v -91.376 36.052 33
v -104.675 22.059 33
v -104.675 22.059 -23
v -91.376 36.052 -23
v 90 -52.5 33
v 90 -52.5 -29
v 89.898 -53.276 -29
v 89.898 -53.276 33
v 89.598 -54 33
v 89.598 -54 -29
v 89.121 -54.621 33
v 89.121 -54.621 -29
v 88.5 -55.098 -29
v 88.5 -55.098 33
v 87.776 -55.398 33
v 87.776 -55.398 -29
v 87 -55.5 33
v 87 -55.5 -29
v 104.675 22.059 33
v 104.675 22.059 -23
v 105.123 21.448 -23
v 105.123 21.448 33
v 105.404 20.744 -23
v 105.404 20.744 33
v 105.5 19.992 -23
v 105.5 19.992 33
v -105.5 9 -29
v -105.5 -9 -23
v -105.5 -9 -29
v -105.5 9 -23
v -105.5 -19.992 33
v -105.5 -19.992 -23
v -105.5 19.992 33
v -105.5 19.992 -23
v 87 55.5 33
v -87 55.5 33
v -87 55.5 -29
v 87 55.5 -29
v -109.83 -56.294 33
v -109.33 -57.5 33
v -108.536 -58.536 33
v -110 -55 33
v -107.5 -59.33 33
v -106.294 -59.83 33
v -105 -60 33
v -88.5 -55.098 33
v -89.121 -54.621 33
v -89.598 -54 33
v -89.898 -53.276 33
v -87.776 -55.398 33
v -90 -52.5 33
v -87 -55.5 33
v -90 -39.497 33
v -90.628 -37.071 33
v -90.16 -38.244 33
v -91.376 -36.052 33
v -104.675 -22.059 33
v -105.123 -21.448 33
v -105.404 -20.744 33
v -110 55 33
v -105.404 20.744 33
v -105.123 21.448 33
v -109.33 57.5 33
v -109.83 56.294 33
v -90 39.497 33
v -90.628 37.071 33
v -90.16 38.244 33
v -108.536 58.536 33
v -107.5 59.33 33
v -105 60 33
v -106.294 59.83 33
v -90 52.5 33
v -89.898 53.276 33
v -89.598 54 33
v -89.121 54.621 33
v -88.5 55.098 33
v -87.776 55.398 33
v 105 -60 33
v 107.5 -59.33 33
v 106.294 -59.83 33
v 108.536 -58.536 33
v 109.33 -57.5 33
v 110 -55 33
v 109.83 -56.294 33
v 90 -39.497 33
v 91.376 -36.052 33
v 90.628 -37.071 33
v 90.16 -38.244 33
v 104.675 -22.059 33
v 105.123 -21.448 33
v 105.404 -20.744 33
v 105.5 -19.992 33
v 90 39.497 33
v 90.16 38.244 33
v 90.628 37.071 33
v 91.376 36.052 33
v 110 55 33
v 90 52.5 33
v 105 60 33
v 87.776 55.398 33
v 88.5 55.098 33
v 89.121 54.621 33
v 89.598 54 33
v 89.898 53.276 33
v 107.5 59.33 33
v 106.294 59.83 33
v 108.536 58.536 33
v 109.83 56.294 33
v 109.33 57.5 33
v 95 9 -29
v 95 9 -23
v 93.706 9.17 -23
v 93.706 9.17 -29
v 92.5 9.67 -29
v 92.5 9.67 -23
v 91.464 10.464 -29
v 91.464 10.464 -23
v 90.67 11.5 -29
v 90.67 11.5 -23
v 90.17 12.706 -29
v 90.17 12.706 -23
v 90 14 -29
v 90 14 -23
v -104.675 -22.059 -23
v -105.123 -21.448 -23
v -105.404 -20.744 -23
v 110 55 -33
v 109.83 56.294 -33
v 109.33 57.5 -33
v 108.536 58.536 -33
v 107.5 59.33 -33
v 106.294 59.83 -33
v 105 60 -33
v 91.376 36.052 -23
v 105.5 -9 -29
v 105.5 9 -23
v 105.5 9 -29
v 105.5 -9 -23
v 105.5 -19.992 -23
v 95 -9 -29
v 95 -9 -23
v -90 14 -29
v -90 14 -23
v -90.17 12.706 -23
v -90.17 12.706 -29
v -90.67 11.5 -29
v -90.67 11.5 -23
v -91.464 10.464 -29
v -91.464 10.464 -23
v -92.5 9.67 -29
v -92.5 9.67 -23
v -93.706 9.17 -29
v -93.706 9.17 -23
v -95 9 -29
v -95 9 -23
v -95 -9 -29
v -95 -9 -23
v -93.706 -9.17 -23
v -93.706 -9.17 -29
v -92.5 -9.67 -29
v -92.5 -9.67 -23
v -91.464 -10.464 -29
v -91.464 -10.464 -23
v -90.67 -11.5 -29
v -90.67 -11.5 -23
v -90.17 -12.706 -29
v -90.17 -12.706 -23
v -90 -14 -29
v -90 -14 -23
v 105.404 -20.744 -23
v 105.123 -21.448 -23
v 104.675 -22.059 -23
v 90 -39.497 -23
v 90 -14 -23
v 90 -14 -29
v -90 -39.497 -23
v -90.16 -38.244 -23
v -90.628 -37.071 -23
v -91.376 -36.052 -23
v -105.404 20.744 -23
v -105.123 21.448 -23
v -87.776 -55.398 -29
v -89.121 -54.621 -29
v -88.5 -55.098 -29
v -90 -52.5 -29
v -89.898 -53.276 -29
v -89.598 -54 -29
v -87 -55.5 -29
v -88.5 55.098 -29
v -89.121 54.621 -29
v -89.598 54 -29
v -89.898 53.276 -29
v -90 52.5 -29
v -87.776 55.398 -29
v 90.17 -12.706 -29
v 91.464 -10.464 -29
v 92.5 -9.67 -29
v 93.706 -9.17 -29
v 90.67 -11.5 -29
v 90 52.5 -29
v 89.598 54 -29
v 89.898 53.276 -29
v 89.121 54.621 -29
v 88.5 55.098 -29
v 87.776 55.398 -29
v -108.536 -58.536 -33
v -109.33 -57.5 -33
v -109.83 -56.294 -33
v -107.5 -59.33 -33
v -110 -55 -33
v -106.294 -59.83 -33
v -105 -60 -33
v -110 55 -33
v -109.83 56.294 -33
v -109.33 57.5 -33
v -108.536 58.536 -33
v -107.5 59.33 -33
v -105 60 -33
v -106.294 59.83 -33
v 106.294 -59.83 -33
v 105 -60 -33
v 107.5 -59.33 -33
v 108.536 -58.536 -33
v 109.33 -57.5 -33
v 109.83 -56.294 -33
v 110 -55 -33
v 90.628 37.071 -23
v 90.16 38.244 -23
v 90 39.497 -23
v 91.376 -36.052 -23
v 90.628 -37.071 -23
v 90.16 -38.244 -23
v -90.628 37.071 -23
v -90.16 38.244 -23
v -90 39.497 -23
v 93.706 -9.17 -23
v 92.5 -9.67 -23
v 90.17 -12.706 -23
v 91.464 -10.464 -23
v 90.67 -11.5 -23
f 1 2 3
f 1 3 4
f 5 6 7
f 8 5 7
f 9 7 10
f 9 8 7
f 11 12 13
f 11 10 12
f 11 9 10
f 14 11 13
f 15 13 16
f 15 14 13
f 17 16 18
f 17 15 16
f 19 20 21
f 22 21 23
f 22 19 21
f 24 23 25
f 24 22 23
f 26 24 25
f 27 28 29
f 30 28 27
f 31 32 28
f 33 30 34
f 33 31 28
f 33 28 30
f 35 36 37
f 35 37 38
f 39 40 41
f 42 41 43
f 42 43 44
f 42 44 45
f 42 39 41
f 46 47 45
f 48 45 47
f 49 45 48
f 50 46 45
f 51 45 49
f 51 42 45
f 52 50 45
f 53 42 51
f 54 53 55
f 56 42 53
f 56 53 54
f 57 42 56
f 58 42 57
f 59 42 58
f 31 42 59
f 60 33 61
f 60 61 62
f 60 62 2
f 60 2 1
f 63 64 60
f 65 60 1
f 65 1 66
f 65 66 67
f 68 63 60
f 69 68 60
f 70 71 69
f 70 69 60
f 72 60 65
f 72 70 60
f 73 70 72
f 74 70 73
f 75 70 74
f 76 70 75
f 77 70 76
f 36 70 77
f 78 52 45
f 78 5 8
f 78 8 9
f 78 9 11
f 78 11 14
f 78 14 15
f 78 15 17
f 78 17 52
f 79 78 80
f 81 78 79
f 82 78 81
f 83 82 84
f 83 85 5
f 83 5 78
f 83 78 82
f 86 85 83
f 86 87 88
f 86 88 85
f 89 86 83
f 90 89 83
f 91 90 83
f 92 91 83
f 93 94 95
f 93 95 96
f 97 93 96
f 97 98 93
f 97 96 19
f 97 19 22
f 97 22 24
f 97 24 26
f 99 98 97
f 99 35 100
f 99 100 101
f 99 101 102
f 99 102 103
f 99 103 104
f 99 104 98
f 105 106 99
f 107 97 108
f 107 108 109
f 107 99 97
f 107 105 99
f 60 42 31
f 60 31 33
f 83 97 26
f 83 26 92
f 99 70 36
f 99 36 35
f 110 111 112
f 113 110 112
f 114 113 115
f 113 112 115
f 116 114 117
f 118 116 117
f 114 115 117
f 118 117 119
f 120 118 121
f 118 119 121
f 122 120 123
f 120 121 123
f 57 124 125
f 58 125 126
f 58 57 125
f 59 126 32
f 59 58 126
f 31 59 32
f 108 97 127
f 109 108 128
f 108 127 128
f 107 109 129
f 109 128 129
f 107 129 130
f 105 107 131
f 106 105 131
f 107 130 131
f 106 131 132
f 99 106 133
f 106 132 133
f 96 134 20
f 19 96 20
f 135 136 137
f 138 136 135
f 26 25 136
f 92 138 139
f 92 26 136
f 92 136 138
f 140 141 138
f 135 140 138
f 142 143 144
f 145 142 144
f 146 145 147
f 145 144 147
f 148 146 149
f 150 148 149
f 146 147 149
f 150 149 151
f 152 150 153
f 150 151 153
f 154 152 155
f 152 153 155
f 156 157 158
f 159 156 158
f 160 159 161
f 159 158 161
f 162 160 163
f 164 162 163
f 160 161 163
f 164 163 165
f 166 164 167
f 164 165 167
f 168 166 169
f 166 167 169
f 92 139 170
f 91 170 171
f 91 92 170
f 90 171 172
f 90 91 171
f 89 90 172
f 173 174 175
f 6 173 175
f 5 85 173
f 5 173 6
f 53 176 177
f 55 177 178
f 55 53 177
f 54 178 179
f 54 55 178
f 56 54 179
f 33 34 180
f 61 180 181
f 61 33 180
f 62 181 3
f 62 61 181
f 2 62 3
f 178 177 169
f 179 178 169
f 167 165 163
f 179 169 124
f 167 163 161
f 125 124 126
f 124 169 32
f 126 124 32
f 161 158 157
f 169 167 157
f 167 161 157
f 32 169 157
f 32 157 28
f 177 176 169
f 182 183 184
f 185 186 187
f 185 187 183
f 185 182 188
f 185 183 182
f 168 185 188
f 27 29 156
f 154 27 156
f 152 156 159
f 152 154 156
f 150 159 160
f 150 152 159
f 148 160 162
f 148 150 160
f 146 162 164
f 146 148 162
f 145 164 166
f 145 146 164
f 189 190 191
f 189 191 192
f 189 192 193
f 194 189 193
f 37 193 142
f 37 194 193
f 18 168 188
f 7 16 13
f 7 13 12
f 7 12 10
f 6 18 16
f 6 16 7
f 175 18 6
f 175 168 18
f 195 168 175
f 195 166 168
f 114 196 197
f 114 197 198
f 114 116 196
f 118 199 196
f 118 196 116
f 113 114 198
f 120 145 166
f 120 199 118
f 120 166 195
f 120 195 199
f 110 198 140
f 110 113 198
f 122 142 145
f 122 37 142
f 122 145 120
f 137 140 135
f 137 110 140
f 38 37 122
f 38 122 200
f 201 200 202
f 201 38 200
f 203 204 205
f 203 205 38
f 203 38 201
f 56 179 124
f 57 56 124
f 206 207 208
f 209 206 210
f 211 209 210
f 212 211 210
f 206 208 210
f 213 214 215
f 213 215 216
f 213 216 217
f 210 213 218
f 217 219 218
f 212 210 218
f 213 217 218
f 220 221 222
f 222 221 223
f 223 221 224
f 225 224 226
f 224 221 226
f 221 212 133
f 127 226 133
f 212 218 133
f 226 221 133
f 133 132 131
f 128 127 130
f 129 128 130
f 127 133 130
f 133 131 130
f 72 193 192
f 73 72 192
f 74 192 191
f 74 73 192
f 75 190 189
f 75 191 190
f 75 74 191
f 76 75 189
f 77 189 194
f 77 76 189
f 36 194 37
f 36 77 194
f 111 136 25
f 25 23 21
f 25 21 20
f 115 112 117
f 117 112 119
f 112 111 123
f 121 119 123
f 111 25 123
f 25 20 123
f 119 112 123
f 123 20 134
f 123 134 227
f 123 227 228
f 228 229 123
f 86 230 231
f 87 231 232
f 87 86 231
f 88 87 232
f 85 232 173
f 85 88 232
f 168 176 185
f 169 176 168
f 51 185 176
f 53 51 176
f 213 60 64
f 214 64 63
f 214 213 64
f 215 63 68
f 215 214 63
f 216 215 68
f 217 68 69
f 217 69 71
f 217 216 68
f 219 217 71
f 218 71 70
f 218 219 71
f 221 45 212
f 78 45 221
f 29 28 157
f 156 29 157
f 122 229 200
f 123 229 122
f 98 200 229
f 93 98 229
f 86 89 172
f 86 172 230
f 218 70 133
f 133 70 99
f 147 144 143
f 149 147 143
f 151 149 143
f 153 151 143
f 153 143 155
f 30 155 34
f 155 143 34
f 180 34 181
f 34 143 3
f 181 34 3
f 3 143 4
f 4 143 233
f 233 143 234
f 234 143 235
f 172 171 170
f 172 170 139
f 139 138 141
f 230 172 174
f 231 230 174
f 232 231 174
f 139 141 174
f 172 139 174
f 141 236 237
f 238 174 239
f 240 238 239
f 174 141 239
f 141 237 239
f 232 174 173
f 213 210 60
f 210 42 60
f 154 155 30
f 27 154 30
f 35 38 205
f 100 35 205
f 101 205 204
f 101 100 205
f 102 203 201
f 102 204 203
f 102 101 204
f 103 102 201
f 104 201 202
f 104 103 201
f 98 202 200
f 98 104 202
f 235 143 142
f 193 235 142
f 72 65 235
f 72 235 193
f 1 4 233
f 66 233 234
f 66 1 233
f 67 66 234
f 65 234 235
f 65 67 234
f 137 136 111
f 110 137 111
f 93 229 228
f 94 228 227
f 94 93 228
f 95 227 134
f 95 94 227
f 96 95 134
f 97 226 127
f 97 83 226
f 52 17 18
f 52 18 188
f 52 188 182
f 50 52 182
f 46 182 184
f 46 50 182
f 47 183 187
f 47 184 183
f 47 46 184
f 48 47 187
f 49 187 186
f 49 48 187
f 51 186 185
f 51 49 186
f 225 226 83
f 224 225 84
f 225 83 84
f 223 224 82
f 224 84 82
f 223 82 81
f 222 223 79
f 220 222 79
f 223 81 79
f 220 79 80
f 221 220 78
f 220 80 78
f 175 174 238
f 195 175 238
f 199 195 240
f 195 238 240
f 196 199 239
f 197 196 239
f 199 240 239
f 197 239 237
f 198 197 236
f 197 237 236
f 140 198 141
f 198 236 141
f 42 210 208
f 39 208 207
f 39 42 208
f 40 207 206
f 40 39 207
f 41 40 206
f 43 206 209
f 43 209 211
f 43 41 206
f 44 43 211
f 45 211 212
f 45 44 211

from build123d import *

# Parameters (mm, degrees)
SKETCH1_W           = 220
SKETCH1_H           = 120
BOSS_EXTRUDE1_DEPTH = 33
CUT_EXTRUDE1_DEPTH  = 56
CUT_EXTRUDE2_DEPTH  = 6
FILLET1_R           = 5


with BuildPart() as part:
    # Sketch1 → Boss-Extrude1 (new, symmetric)
    with BuildSketch(Plane.XY):
        Rectangle(SKETCH1_W, SKETCH1_H)
    extrude(amount=BOSS_EXTRUDE1_DEPTH, both=True)

    # Sketch2 → Cut-Extrude1 (cut)
    with BuildSketch(Plane.XY.offset(33)):
        with BuildLine():
            Line((-87, 55.5), (87, 55.5))
            ThreePointArc((87, 55.5), (89.121320344, 54.621320344), (90, 52.5))
            Line((90, 52.5), (90, 39.49693341))
            ThreePointArc((90, 39.49693341), (90.356635174, 37.642435339), (91.375665238, 36.052488965))
            Line((91.375665238, 36.052488965), (104.674600857, 22.059000191))
            ThreePointArc((104.674600857, 22.059000191), (105.286018895, 21.105032366), (105.5, 19.992333524))
            Line((105.5, 19.992333524), (105.5, -19.992333524))
            ThreePointArc((105.5, -19.992333524), (105.286018895, -21.105032366), (104.674600857, -22.059000191))
            Line((104.674600857, -22.059000191), (91.375665238, -36.052488965))
            ThreePointArc((91.375665238, -36.052488965), (90.356635174, -37.642435339), (90, -39.49693341))
            Line((90, -39.49693341), (90, -52.5))
            ThreePointArc((90, -52.5), (89.121320344, -54.621320344), (87, -55.5))
            Line((87, -55.5), (-87, -55.5))
            ThreePointArc((-87, -55.5), (-89.121320344, -54.621320344), (-90, -52.5))
            Line((-90, -52.5), (-90, -39.49693341))
            ThreePointArc((-90, -39.49693341), (-90.356635174, -37.642435339), (-91.375665238, -36.052488965))
            Line((-91.375665238, -36.052488965), (-104.674600857, -22.059000191))
            ThreePointArc((-104.674600857, -22.059000191), (-105.286018895, -21.105032366), (-105.5, -19.992333524))
            Line((-105.5, -19.992333524), (-105.5, 19.992333524))
            ThreePointArc((-105.5, 19.992333524), (-105.286018895, 21.105032366), (-104.674600857, 22.059000191))
            Line((-104.674600857, 22.059000191), (-91.375665238, 36.052488965))
            ThreePointArc((-91.375665238, 36.052488965), (-90.356635174, 37.642435339), (-90, 39.49693341))
            Line((-90, 39.49693341), (-90, 52.5))
            ThreePointArc((-90, 52.5), (-89.121320344, 54.621320344), (-87, 55.5))
        make_face()
    extrude(amount=-CUT_EXTRUDE1_DEPTH, mode=Mode.SUBTRACT)

    # Sketch3 → Cut-Extrude2 (cut)
    with BuildSketch(Plane.XY.offset(-23)):
        with BuildLine():
            Line((-90, 52.5), (-90, 39.49693341))
            Line((-90, 39.49693341), (-90, 14))
            ThreePointArc((-90, 14), (-91.464466094, 10.464466094), (-95, 9))
            Line((-95, 9), (-105.5, 9))
            Line((-105.5, 9), (-105.5, -9))
            Line((-105.5, -9), (-95, -9))
            ThreePointArc((-95, -9), (-91.464466094, -10.464466094), (-90, -14))
            Line((-90, -14), (-90, -39.49693341))
            Line((-90, -39.49693341), (-90, -52.5))
            ThreePointArc((-90, -52.5), (-89.121320344, -54.621320344), (-87, -55.5))
            Line((-87, -55.5), (87, -55.5))
            ThreePointArc((87, -55.5), (89.121320344, -54.621320344), (90, -52.5))
            Line((90, -52.5), (90, -39.49693341))
            Line((90, -39.49693341), (90, -14))
            ThreePointArc((90, -14), (91.464466094, -10.464466094), (95, -9))
            Line((95, -9), (105.5, -9))
            Line((105.5, -9), (105.5, 9))
            Line((105.5, 9), (95, 9))
            ThreePointArc((95, 9), (91.464466094, 10.464466094), (90, 14))
            Line((90, 14), (90, 39.49693341))
            Line((90, 39.49693341), (90, 52.5))
            ThreePointArc((90, 52.5), (89.121320344, 54.621320344), (87, 55.5))
            Line((87, 55.5), (-87, 55.5))
            ThreePointArc((-87, 55.5), (-89.121320344, 54.621320344), (-90, 52.5))
        make_face()
    extrude(amount=-CUT_EXTRUDE2_DEPTH, mode=Mode.SUBTRACT)

    # Fillet1
    fillet1_edges = [part.edges().sort_by_distance(p)[0] for p in [
        (-110, 60, 0),
        (110, 60, 0),
        (110, -60, 0),
        (-110, -60, 0),
    ]]
    fillet(fillet1_edges, radius=FILLET1_R)


solid = part.part
